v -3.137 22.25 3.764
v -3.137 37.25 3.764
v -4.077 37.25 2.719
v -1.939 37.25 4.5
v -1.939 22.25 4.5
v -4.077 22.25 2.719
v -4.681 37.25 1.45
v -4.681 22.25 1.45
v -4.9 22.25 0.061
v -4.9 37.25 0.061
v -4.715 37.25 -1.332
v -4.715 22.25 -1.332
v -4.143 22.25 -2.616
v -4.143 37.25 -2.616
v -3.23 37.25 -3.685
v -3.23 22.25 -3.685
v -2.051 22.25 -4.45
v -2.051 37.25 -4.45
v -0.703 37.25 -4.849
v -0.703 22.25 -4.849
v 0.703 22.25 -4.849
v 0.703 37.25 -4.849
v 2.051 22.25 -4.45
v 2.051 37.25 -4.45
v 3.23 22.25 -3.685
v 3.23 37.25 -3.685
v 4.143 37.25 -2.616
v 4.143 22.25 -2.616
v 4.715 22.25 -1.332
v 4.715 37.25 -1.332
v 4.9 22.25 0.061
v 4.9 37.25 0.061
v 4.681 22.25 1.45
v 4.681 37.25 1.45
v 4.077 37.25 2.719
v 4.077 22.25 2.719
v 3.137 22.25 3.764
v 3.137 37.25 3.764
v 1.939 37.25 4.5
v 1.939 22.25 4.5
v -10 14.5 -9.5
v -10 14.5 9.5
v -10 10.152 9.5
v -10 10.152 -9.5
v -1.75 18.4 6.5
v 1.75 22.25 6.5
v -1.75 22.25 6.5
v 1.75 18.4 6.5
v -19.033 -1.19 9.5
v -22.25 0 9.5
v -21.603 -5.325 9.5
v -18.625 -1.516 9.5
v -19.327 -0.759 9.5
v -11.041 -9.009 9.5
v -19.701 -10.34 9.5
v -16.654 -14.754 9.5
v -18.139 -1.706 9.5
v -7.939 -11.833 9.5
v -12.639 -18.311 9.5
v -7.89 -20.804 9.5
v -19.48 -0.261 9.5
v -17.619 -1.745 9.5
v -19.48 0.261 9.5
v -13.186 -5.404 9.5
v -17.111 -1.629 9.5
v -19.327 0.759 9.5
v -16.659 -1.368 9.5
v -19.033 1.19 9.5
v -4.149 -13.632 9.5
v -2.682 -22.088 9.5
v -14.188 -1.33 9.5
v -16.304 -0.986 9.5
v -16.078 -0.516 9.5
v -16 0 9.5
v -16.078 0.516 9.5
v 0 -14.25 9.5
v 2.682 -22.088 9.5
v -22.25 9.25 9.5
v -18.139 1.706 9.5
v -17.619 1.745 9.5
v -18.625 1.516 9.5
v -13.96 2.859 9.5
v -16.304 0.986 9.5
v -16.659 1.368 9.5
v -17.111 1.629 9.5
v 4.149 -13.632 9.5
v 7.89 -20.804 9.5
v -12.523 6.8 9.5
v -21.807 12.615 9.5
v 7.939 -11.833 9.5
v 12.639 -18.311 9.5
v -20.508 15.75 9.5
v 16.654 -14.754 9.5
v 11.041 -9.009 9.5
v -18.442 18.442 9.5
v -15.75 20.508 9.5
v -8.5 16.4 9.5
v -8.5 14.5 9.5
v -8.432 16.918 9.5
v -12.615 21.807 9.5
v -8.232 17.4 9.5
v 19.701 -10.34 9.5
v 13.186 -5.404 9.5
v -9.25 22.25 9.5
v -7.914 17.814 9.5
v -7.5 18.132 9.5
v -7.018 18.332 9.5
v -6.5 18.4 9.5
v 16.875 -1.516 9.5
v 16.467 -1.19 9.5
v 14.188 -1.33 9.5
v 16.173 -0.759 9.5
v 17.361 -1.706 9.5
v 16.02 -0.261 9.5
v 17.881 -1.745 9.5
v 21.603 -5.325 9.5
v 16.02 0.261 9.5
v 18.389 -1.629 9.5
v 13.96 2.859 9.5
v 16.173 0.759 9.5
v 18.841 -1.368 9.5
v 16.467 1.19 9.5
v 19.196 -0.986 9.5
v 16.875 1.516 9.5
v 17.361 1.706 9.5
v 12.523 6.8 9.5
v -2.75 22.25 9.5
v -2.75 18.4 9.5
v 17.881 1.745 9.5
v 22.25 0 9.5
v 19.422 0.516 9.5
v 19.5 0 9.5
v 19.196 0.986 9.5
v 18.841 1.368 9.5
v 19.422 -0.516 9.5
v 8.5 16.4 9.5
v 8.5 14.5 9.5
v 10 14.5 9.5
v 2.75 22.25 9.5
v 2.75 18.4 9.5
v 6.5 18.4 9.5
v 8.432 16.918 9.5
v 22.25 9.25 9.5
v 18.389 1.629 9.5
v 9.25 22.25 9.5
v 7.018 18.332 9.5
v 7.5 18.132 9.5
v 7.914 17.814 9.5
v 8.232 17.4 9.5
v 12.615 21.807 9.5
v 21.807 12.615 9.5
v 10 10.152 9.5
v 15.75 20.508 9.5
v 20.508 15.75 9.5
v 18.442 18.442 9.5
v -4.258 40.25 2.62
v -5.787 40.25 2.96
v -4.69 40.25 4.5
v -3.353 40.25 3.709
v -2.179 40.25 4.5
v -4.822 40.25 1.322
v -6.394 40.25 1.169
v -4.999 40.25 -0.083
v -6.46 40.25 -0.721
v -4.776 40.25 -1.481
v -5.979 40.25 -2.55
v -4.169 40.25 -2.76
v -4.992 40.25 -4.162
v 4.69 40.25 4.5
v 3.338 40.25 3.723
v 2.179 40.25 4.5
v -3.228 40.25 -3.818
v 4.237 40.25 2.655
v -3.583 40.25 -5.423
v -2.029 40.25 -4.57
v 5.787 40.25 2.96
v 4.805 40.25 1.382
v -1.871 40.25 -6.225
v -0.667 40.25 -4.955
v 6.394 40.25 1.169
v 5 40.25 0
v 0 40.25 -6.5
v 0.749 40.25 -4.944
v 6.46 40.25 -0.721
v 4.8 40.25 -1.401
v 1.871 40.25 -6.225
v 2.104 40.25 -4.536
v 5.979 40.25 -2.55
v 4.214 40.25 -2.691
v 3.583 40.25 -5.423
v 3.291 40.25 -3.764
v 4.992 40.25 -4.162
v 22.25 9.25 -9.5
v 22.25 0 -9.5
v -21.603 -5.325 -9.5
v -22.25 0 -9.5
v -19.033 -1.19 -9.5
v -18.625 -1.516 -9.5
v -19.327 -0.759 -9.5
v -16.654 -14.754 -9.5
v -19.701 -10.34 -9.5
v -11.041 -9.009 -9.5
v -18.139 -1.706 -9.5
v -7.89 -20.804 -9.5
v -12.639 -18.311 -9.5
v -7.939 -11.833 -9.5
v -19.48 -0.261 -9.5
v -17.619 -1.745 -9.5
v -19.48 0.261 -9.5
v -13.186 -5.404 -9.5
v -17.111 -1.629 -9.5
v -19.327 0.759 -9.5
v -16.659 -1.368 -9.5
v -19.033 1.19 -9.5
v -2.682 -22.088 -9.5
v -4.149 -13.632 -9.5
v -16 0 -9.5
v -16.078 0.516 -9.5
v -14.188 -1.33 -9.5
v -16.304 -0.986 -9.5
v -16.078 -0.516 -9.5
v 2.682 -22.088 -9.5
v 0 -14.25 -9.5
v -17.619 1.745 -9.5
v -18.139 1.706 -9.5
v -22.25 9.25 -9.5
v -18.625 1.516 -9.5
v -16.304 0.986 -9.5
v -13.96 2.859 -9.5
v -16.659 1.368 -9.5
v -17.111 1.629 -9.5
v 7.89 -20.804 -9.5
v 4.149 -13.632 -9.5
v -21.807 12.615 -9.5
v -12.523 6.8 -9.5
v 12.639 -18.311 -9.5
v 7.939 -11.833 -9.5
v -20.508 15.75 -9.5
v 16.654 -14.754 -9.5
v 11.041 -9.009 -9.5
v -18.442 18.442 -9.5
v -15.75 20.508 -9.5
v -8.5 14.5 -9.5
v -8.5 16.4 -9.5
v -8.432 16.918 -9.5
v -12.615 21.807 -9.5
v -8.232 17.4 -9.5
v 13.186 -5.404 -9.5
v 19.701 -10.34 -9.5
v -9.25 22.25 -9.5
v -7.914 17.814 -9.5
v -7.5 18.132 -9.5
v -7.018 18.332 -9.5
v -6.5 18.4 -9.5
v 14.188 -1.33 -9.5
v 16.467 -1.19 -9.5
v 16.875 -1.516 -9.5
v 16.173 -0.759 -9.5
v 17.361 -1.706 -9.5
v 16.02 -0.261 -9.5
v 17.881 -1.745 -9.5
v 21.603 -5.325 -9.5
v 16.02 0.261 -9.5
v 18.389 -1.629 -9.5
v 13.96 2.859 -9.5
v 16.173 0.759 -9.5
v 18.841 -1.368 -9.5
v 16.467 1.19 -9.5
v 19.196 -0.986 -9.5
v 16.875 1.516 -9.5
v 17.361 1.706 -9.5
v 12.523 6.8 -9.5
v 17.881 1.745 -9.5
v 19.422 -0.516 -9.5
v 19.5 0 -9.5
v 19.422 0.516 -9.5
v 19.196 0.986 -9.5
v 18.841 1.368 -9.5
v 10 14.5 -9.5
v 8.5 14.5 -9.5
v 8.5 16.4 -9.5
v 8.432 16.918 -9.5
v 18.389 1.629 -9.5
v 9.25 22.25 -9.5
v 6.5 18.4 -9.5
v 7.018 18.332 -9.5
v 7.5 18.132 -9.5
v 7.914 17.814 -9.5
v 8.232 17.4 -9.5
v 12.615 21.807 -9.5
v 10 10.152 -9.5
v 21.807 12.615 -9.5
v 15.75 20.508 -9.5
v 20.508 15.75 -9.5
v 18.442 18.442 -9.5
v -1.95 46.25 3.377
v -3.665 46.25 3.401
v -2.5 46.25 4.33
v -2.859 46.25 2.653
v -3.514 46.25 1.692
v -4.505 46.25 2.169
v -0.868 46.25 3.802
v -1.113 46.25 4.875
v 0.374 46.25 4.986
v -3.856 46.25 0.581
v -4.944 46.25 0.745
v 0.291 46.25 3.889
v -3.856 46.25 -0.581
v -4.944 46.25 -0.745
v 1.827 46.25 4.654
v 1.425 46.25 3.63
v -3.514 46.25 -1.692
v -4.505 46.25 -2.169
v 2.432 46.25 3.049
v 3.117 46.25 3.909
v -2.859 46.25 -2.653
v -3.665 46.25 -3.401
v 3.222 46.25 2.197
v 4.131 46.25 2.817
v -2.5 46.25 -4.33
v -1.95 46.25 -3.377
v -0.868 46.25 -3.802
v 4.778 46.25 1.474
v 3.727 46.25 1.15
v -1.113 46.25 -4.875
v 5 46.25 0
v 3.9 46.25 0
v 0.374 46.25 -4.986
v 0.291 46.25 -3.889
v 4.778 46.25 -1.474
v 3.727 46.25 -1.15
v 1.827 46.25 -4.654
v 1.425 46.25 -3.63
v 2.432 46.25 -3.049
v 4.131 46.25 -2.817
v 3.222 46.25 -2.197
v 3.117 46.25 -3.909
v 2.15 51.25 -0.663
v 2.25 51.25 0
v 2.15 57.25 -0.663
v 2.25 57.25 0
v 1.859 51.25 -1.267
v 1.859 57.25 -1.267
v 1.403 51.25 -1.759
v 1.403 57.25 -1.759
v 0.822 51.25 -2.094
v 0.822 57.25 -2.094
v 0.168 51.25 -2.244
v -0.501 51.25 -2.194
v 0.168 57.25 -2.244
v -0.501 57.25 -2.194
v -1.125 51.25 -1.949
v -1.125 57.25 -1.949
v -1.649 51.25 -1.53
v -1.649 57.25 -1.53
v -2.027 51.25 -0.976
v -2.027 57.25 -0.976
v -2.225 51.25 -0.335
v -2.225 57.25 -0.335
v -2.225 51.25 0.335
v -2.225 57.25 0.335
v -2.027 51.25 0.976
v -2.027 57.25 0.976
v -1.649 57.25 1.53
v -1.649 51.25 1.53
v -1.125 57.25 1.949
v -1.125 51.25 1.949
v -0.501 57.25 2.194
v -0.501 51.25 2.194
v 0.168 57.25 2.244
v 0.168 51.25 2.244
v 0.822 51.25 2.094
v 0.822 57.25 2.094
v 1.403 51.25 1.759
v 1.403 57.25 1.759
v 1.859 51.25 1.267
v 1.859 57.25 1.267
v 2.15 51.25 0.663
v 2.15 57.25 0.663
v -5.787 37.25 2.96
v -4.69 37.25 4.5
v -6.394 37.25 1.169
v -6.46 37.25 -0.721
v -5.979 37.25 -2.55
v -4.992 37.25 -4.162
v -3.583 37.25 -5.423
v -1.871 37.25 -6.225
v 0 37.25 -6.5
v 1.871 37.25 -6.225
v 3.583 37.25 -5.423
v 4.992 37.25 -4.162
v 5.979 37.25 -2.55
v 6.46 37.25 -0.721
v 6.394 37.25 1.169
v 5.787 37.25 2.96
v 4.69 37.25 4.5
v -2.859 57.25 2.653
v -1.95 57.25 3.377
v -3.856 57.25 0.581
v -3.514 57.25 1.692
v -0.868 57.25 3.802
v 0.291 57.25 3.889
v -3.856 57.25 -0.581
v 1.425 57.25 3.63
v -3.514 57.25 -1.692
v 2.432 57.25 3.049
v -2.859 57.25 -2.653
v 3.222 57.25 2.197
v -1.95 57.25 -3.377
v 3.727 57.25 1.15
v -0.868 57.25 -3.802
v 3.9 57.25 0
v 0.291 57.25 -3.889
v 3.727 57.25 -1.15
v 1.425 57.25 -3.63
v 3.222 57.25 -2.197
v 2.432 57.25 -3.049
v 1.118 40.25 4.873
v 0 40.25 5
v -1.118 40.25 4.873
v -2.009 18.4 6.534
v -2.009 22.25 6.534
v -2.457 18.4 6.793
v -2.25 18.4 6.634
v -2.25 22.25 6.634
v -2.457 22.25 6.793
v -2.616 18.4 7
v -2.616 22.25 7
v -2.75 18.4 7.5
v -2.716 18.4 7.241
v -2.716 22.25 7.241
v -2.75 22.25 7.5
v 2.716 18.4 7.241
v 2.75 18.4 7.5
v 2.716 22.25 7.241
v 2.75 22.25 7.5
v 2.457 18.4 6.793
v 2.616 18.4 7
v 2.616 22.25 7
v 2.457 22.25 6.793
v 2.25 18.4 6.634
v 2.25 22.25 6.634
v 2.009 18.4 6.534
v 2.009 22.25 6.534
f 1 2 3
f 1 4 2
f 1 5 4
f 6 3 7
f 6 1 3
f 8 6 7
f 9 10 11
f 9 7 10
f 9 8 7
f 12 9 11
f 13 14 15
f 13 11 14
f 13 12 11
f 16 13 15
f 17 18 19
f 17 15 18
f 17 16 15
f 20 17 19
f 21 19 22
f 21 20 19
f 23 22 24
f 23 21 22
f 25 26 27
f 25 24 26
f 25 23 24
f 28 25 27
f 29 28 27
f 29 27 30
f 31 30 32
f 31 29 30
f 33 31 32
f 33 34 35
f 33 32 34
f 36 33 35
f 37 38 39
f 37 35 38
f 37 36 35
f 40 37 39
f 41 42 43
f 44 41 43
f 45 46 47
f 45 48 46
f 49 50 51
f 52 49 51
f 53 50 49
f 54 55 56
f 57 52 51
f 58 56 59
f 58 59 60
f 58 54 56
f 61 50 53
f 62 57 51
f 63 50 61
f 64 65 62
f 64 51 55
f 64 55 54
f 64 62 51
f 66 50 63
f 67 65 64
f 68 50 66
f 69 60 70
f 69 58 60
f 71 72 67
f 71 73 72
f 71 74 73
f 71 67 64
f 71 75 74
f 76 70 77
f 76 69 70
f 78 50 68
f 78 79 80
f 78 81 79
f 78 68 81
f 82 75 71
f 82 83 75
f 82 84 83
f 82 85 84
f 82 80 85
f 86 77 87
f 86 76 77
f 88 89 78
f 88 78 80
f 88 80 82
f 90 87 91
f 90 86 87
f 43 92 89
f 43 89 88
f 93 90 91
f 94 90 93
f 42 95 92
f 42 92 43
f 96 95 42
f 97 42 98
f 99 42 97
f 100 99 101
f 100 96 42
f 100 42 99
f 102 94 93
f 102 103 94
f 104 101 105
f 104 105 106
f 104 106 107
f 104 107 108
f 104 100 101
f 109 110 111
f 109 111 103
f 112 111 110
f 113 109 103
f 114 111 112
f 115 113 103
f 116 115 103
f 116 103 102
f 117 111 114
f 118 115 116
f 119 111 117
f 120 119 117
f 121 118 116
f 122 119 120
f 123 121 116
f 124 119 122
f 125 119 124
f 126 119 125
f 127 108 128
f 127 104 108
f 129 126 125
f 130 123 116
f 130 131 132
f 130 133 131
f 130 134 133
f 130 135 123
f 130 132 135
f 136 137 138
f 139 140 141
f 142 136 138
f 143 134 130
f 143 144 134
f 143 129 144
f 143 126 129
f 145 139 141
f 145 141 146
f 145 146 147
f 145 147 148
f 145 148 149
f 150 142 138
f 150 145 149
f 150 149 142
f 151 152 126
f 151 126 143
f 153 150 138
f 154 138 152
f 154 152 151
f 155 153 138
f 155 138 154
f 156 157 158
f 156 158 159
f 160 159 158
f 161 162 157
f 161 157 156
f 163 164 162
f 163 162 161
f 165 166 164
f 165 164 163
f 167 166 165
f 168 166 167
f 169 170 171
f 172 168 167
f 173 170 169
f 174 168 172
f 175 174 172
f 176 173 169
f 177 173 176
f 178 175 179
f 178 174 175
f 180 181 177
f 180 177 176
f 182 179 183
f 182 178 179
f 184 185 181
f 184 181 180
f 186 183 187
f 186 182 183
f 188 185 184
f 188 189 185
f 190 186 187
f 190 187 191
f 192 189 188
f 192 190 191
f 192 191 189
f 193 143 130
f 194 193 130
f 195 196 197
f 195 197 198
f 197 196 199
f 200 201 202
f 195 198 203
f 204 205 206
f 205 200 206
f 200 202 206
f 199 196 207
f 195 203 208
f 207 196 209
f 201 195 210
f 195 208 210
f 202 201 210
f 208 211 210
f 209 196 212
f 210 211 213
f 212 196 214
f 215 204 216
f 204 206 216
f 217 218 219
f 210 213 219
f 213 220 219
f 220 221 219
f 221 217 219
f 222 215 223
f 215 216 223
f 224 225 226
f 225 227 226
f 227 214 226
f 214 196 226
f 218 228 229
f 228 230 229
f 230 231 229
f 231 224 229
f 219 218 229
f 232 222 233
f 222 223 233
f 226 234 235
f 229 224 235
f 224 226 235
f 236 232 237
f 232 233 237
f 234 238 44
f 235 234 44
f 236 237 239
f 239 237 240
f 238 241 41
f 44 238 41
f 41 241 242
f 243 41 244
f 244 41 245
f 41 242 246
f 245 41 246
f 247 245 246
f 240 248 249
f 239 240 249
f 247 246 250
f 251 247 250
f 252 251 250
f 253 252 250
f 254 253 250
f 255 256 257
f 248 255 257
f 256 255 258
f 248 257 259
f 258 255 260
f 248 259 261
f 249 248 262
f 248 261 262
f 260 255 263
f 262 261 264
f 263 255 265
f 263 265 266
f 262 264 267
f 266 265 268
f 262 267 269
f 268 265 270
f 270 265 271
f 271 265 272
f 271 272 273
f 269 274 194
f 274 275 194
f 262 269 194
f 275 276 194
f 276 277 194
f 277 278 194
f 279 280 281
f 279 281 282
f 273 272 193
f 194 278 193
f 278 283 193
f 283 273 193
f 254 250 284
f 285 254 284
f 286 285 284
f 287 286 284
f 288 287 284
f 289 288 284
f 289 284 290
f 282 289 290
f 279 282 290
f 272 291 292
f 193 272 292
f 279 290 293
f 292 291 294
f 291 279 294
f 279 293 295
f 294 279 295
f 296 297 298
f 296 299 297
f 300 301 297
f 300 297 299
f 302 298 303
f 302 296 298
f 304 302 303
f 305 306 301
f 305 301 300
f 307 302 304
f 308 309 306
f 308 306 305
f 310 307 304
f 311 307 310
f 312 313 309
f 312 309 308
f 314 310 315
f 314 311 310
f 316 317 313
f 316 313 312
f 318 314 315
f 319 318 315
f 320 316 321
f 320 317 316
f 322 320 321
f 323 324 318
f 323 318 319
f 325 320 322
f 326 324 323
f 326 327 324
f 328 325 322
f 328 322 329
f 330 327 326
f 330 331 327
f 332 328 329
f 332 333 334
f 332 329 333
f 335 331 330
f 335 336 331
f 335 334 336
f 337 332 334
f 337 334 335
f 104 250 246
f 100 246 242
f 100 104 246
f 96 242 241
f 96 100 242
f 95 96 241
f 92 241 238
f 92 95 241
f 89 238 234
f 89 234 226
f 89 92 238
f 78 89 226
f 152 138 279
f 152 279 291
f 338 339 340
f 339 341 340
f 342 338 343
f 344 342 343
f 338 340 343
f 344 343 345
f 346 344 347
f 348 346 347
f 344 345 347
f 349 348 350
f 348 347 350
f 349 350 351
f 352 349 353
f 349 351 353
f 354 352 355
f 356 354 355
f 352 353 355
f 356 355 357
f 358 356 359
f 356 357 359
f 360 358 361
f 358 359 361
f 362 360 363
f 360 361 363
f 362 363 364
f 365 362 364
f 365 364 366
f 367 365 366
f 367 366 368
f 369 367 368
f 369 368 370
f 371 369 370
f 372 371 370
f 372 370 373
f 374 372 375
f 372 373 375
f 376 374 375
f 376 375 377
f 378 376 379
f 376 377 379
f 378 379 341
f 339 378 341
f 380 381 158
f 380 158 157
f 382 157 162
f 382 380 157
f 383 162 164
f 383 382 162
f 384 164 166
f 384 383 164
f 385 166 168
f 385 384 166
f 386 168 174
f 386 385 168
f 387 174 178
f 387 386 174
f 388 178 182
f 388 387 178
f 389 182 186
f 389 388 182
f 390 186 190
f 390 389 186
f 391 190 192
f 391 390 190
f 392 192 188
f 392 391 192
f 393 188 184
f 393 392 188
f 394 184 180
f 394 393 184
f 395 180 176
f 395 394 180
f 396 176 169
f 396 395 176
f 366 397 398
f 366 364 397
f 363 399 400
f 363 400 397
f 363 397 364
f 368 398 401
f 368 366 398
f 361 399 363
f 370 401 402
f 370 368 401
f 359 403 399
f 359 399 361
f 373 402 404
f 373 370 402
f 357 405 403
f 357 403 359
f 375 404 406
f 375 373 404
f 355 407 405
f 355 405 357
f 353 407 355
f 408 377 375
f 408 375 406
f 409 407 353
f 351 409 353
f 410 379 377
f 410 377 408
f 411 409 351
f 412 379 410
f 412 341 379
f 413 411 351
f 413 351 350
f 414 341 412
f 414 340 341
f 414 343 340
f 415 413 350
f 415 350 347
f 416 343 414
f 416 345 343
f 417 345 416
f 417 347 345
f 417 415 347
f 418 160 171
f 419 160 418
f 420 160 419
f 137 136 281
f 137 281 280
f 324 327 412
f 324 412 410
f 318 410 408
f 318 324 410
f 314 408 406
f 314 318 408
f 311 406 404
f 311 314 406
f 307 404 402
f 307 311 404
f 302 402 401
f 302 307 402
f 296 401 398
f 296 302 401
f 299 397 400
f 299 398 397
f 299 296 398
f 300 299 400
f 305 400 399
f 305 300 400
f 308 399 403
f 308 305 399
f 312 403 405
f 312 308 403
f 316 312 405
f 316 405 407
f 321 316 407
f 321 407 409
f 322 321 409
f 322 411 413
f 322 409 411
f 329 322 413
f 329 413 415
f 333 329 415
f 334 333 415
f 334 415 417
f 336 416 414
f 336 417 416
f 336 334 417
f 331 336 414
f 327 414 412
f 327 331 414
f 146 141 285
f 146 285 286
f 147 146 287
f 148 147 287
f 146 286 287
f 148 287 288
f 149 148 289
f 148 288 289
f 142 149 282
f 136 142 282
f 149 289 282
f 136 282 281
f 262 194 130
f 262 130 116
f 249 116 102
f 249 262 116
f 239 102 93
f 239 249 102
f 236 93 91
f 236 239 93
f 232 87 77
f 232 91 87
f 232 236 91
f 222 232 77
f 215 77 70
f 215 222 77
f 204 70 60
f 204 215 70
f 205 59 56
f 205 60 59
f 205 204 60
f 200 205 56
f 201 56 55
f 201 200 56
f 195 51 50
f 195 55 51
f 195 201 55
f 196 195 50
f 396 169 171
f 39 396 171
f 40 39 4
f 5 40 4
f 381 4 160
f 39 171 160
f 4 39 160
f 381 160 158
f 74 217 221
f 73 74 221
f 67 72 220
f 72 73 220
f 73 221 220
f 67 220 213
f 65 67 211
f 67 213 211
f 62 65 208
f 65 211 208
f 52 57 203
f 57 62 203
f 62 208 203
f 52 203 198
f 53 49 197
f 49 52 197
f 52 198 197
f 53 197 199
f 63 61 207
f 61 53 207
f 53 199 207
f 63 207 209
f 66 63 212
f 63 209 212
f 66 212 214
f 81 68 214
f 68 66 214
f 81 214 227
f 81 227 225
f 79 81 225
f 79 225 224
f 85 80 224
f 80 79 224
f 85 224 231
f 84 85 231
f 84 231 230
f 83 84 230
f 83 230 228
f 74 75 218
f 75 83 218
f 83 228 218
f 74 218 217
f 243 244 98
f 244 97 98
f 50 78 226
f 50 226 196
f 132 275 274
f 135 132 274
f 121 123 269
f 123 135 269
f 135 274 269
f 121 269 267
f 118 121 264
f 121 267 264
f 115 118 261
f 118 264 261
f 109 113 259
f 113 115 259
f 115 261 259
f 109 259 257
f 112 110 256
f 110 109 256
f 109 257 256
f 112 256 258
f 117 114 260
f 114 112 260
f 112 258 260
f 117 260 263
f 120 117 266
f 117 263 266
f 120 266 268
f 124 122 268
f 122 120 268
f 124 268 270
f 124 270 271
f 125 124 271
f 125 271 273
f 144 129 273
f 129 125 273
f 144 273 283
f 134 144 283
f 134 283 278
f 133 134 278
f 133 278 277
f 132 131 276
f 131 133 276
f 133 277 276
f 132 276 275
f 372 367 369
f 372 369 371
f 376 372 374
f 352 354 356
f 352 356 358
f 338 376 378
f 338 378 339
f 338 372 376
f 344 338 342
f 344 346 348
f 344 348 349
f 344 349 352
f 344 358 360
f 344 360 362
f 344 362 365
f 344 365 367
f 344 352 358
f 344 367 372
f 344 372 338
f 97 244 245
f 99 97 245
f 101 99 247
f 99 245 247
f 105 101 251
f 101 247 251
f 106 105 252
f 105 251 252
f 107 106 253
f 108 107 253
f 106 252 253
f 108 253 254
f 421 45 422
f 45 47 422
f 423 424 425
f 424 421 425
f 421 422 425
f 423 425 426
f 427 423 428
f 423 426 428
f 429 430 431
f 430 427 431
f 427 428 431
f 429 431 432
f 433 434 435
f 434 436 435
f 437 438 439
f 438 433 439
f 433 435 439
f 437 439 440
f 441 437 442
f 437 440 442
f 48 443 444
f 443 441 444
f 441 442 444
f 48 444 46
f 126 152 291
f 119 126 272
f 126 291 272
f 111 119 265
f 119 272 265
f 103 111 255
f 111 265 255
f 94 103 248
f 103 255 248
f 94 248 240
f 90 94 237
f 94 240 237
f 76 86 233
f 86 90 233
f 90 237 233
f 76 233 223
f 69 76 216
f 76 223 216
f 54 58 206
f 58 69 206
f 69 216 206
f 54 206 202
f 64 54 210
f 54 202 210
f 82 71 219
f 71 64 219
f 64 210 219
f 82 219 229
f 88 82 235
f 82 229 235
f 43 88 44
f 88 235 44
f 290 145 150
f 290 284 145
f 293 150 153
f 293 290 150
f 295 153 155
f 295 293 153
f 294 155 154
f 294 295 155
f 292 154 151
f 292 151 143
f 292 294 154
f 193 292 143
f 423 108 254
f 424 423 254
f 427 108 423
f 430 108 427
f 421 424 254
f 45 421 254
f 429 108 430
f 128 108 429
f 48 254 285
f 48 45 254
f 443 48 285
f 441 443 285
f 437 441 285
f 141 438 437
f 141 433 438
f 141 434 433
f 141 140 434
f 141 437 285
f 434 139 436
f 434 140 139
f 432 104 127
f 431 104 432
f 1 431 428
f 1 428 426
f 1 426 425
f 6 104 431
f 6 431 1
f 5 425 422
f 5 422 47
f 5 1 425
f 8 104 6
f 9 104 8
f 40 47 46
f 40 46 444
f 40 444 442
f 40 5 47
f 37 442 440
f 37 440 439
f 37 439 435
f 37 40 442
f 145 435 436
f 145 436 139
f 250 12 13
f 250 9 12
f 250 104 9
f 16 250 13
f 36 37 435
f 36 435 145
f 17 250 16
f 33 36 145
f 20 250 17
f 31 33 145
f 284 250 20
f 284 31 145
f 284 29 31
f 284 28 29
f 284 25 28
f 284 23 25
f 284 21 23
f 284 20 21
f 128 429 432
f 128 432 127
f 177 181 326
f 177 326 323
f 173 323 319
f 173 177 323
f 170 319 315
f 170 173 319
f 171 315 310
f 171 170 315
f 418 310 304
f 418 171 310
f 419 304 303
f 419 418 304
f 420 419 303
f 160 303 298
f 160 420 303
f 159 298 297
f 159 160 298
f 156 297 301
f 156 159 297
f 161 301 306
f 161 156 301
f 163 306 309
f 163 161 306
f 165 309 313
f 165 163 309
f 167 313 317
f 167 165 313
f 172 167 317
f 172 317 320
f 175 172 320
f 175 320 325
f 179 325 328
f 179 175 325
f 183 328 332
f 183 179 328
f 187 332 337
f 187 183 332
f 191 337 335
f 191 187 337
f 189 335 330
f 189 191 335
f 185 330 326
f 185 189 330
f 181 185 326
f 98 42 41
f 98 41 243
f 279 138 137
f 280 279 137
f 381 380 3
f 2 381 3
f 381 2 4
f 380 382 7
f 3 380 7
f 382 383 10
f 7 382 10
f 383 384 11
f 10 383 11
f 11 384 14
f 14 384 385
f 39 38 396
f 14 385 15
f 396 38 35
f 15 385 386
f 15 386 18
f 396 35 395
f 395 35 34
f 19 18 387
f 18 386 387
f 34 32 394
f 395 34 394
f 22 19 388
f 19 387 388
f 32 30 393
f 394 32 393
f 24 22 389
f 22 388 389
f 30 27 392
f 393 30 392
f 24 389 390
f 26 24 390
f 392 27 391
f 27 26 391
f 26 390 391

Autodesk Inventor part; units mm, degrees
ref_plane "YZ Plane" through (0, 0, 0) normal (1, 0, 0) x (0, 1, 0)
ref_plane "XZ Plane" through (0, 0, 0) normal (0, 1, 0) x (-1, 0, 0)
ref_plane "XY Plane" through (0, 0, 0) normal (0, 0, 1) x (1, 0, 0)
sketch "Skizze1" plane through (0, 0, 0) normal (0, 0, 1) x (1, 0, 0)
  circle A0 centre (17.75, 0) radius 1.75
  circle A1 centre (-17.75, 0) radius 1.75
  circle A2 centre (0, 0) radius 14.25
  arc A3 (-22.25, 0) -> (22.25, 0) centre (0, 0) ccw
  line L0 (-22.25, 25.25) -> (22.25, 25.25)
  line L1 (22.25, 25.25) -> (22.25, 22.25)
  line L2 (22.25, 22.25) -> (-22.25, 22.25)
  line L3 (-22.25, 22.25) -> (-22.25, 25.25)
  line L4 (0, -31.75) -> (0, 34.75) projected
  line L5 (-22.25, 22.25) -> (-22.25, 0)
  line L6 (22.25, 22.25) -> (22.25, 0)
  dimension "d2" = 3.5
  dimension "d3" = 3.5
  dimension "d8" = 28.5
  dimension "d9" = 44.5
  dimension "d10" = 44.5
  dimension "d11" = 3
extrude "Extrusion2" add sketch "Skizze1" along normal mid plane 19 contours A2 L4 L2 L6 A3 | A2 L4 A3 L5 L2
sketch "Skizze2" plane through (0, 0, 9.5) normal (0, 0, 1) x (1, 0, 0)
  line L0 (-8.5, 18.4) -> (8.5, 18.4)
  line L1 (8.5, 18.4) -> (8.5, 11.4)
  line L2 (8.5, 11.4) -> (-8.5, 11.4)
  line L3 (0, -31.15) -> (0, 31.15) projected
  line L4 (-31.15, 0) -> (31.15, 0) projected
  line L5 (-10, 14.5) -> (-8.5, 14.5)
  line L6 (-10, 14.5) -> (-10, 10)
  line L7 (-10, 10) -> (-8.5, 10)
  line L8 (-8.5, 18.4) -> (-8.5, 11.4)
  line L9 (-8.5, 14.5) -> (-8.5, 10)
  line L10 (10, 14.5) -> (8.5, 14.5)
  line L11 (10, 14.5) -> (10, 10)
  line L12 (10, 10) -> (8.5, 10)
  line L13 (8.5, 14.5) -> (8.5, 10)
  point P0 (0, 0)
  point P1 (0, 11.4)
  point P2 (0, 18.4)
  dimension "d14" = 17
  dimension "d15" = 7
  dimension "d16" = 11.4
  dimension "d34" = 1.5
  dimension "d45" = 4.5
  dimension "d46" = 10
  dimension "d48" = 1.5
extrude "Extrusion3" cut sketch "Skizze2" against normal blind 19
sketch "Skizze3" plane through (-8.5, 18.4, 9.5) normal (0, -1, 0) x (1, 0, 0)
  line L0 (0, 0) -> (17, 0) projected
  line L1 (5.75, 0) -> (11.25, 0)
  line L2 (11.25, 0) -> (11.25, -3)
  line L3 (11.25, -3) -> (5.75, -3)
  line L4 (5.75, -3) -> (5.75, 0)
  line L5 (0, 0) -> (0, -19) projected
  point P0 (8.5, -9.5)
  dimension "d19" = 5.5
  dimension "d20" = 3
  dimension "d38" = 5.75
extrude "Extrusion4" cut sketch "Skizze3" against normal blind 4
fillet "Rundung1" radius 2 2 edges at (-8.5, 18.4, 0) (8.5, 18.4, 0)
sketch "Skizze4" plane through (-22.25, 22.25, -9.5) normal (0, 1, 0) x (1, 0, 0)
  line L0 (0, -19) -> (0, 0) projected
  line L1 (0, 0) -> (44.5, 0) projected
  line L2 (44.5, -19) -> (0, -19) projected
  line L3 (44.5, 0) -> (44.5, -19) projected
  circle A0 centre (22.25, -9.5) radius 4.9
  point P0 (25, -19)
  dimension "d39" = 9.8
fillet "Rundung2" radius 1 2 edges at (-2.75, 20.325, 6.5) (2.75, 20.325, 6.5)
extrude "Extrusion7" add sketch "Skizze4" along normal blind 15 contours A0
sketch "Skizze5" plane through (0, 37.25, 0) normal (0, 1, 0) x (1, 0, 0)
  circle A0 centre (0, 0) radius 6.5
  dimension "d51" = 13
extrude "Extrusion8" add sketch "Skizze5" along normal blind 3
sketch "Skizze6" plane through (0, 40.25, 0) normal (0, 1, 0) x (1, 0, 0)
  circle A0 centre (0, 0) radius 5
  dimension "d54" = 10
extrude "Extrusion9" add sketch "Skizze6" along normal blind 6
sketch "Skizze8" plane through (0, 40.25, 0) normal (0, 1, 0) x (1, 0, 0)
  line L0 (-6.5, 9.5) -> (-6.5, -9.5) projected
  line L1 (6.5, -9.5) -> (6.5, 9.5) projected
  line L2 (-6.5, 0) -> (6.5, 0)
  line L3 (6.5, 0) -> (6.5, -6.5)
  line L4 (6.5, -6.5) -> (-6.5, -6.5)
  line L5 (-6.5, -6.5) -> (-6.5, 0)
  line L6 (-6.5, -6.5) -> (6.5, -6.5)
  line L7 (6.5, -6.5) -> (6.5, -4.5)
  line L8 (6.5, -4.5) -> (-6.5, -4.5)
  line L9 (-6.5, -4.5) -> (-6.5, -6.5)
  point P0 (0, 0)
  point P1 (-6.5, -4.5)
  point P2 (-6.5, -6.5)
  dimension "d60" = 6.5
  dimension "d61" = 2
sketch "Skizze9" plane through (0, 46.25, 0) normal (0, 1, 0) x (1, 0, 0)
  circle A0 centre (0, 0) radius 3.9
  dimension "d62" = 7.8
extrude "Extrusion11" add sketch "Skizze9" along normal blind 11
sketch "Skizze10" plane through (0, 57.25, 0) normal (0, 1, 0) x (1, 0, 0)
  circle A0 centre (0, 0) radius 2.25
  dimension "d65" = 4.5
extrude "Extrusion12" cut sketch "Skizze10" against normal blind 6
extrude "Extrusion13" cut sketch "Skizze8" against normal blind 18 contours L8 L1 L4 L0
fillet "Rundung6" radius 13 2 edges at (-22.25, 22.25, 0) (22.25, 22.25, 0)
properties part number "_3D-Druck"
